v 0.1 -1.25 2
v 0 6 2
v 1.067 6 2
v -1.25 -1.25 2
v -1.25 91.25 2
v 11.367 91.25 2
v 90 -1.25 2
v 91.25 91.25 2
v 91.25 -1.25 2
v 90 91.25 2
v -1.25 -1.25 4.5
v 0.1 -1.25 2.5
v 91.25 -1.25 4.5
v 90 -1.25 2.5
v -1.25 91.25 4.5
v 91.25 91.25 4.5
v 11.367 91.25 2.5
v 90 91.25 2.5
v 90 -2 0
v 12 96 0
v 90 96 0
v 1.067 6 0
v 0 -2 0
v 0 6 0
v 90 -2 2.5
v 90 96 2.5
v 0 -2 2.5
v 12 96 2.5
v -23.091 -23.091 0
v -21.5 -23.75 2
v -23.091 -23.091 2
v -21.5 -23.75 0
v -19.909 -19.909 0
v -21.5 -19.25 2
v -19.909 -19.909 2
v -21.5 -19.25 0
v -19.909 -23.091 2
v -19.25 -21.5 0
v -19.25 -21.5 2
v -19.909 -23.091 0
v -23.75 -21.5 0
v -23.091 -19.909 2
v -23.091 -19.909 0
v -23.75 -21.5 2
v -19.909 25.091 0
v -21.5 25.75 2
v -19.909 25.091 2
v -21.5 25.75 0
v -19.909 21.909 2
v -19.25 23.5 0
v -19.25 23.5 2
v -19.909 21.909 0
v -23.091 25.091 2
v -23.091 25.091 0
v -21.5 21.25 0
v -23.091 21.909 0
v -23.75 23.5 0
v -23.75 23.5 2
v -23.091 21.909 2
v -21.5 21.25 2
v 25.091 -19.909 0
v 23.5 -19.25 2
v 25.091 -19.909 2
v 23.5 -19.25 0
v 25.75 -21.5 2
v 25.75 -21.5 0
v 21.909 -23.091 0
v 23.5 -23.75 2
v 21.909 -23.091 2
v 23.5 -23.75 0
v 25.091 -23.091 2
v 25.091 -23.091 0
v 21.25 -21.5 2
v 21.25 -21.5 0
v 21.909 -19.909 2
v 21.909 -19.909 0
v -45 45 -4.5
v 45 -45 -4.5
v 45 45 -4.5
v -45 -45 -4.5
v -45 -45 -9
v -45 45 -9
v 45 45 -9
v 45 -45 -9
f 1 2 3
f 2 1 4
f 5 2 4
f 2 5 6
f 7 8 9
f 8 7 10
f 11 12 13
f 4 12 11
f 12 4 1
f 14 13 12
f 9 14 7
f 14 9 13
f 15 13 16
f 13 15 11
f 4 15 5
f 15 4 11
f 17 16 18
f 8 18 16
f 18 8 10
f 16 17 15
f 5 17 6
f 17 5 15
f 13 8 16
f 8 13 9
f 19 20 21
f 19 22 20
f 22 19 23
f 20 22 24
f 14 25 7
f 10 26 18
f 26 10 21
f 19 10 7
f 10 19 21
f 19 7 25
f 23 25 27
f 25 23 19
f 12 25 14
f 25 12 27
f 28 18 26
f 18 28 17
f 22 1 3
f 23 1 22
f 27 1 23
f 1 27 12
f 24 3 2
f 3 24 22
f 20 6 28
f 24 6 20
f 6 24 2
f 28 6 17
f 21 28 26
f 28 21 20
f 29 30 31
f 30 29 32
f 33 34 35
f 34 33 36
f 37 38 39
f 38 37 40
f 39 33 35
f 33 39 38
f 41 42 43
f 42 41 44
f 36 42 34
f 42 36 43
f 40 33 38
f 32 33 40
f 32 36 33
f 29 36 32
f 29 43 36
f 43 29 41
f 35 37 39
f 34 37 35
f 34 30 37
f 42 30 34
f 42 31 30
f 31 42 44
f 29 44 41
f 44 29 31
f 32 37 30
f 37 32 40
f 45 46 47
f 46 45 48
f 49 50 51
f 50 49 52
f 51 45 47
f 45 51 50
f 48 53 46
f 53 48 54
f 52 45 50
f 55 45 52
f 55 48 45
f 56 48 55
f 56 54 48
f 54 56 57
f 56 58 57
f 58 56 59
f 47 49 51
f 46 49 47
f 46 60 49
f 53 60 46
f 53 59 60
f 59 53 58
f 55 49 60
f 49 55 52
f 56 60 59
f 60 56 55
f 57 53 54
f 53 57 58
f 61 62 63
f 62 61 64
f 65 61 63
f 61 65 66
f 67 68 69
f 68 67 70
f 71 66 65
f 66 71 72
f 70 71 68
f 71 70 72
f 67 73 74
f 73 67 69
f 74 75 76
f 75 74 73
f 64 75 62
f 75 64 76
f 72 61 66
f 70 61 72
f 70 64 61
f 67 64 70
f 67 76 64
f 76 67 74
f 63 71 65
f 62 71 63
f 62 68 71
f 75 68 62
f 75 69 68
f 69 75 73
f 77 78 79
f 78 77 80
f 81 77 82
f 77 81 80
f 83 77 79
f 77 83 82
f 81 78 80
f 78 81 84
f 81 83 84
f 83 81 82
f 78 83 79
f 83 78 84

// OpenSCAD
// Dimensions in mm
top_plate_thickness = 2;
wall_thickness = 2.5;
outer_size_x = 90;
outer_size_y = 90;
hole_diameter = 4.5;
screw_pattern_square_side = sqrt((outer_size_x / 2) * (outer_size_y / 2));
power_cable_notch_width = 12;
power_cable_notch_depth = 8;

// Top plate
translate([0, 0, top_plate_thickness])
    linear_extrude(top_plate_thickness)
        polygon(points=[[0, 0], [outer_size_x, 0], [outer_size_x, outer_size_y], [0, outer_size_y]]);

// Walls
for (x = [-wall_thickness/2, wall_thickness/2]) {
    for (y = [-wall_thickness/2, wall_thickness/2]) {
        translate([x, y, top_plate_thickness])
            linear_extrude(wall_thickness)
                polygon(points=[[0, 0], [outer_size_x, 0], [outer_size_x, outer_size_y], [0, outer_size_y]]);
    }
}

// Power cable notch
for (y = [-power_cable_notch_depth/2, power_cable_notch_depth/2]) {
    translate([0, y + top_plate_thickness])
        linear_extrude(wall_thickness)
            polygon(points=[[0, 0], [outer_size_x, 0], [outer_size_x, outer_size_y], [power_cable_notch_width, outer_size_y]]);
}

// M4 screw holes
for (x = [-screw_pattern_square_side/2, screw_pattern_square_side/2]) {
    for (y = [-screw_pattern_square_side/2, screw_pattern_square_side/2]) {
        translate([x + top_plate_thickness/2, y + top_plate_thickness/2])
            linear_extrude(top_plate_thickness)
                circle(r=hole_diameter/2);
    }
}

// Mirror to flip the model
mirror([0, 0, -1])
    // Fan mounting holes are at the bottom of the box, so we need to mirror this part as well
    translate([-outer_size_x/2, -outer_size_y/2, top_plate_thickness + wall_thickness])
        linear_extrude(top_plate_thickness + wall_thickness)
            polygon(points=[[0, 0], [outer_size_x, 0], [outer_size_x, outer_size_y], [0, outer_size_y]]);
